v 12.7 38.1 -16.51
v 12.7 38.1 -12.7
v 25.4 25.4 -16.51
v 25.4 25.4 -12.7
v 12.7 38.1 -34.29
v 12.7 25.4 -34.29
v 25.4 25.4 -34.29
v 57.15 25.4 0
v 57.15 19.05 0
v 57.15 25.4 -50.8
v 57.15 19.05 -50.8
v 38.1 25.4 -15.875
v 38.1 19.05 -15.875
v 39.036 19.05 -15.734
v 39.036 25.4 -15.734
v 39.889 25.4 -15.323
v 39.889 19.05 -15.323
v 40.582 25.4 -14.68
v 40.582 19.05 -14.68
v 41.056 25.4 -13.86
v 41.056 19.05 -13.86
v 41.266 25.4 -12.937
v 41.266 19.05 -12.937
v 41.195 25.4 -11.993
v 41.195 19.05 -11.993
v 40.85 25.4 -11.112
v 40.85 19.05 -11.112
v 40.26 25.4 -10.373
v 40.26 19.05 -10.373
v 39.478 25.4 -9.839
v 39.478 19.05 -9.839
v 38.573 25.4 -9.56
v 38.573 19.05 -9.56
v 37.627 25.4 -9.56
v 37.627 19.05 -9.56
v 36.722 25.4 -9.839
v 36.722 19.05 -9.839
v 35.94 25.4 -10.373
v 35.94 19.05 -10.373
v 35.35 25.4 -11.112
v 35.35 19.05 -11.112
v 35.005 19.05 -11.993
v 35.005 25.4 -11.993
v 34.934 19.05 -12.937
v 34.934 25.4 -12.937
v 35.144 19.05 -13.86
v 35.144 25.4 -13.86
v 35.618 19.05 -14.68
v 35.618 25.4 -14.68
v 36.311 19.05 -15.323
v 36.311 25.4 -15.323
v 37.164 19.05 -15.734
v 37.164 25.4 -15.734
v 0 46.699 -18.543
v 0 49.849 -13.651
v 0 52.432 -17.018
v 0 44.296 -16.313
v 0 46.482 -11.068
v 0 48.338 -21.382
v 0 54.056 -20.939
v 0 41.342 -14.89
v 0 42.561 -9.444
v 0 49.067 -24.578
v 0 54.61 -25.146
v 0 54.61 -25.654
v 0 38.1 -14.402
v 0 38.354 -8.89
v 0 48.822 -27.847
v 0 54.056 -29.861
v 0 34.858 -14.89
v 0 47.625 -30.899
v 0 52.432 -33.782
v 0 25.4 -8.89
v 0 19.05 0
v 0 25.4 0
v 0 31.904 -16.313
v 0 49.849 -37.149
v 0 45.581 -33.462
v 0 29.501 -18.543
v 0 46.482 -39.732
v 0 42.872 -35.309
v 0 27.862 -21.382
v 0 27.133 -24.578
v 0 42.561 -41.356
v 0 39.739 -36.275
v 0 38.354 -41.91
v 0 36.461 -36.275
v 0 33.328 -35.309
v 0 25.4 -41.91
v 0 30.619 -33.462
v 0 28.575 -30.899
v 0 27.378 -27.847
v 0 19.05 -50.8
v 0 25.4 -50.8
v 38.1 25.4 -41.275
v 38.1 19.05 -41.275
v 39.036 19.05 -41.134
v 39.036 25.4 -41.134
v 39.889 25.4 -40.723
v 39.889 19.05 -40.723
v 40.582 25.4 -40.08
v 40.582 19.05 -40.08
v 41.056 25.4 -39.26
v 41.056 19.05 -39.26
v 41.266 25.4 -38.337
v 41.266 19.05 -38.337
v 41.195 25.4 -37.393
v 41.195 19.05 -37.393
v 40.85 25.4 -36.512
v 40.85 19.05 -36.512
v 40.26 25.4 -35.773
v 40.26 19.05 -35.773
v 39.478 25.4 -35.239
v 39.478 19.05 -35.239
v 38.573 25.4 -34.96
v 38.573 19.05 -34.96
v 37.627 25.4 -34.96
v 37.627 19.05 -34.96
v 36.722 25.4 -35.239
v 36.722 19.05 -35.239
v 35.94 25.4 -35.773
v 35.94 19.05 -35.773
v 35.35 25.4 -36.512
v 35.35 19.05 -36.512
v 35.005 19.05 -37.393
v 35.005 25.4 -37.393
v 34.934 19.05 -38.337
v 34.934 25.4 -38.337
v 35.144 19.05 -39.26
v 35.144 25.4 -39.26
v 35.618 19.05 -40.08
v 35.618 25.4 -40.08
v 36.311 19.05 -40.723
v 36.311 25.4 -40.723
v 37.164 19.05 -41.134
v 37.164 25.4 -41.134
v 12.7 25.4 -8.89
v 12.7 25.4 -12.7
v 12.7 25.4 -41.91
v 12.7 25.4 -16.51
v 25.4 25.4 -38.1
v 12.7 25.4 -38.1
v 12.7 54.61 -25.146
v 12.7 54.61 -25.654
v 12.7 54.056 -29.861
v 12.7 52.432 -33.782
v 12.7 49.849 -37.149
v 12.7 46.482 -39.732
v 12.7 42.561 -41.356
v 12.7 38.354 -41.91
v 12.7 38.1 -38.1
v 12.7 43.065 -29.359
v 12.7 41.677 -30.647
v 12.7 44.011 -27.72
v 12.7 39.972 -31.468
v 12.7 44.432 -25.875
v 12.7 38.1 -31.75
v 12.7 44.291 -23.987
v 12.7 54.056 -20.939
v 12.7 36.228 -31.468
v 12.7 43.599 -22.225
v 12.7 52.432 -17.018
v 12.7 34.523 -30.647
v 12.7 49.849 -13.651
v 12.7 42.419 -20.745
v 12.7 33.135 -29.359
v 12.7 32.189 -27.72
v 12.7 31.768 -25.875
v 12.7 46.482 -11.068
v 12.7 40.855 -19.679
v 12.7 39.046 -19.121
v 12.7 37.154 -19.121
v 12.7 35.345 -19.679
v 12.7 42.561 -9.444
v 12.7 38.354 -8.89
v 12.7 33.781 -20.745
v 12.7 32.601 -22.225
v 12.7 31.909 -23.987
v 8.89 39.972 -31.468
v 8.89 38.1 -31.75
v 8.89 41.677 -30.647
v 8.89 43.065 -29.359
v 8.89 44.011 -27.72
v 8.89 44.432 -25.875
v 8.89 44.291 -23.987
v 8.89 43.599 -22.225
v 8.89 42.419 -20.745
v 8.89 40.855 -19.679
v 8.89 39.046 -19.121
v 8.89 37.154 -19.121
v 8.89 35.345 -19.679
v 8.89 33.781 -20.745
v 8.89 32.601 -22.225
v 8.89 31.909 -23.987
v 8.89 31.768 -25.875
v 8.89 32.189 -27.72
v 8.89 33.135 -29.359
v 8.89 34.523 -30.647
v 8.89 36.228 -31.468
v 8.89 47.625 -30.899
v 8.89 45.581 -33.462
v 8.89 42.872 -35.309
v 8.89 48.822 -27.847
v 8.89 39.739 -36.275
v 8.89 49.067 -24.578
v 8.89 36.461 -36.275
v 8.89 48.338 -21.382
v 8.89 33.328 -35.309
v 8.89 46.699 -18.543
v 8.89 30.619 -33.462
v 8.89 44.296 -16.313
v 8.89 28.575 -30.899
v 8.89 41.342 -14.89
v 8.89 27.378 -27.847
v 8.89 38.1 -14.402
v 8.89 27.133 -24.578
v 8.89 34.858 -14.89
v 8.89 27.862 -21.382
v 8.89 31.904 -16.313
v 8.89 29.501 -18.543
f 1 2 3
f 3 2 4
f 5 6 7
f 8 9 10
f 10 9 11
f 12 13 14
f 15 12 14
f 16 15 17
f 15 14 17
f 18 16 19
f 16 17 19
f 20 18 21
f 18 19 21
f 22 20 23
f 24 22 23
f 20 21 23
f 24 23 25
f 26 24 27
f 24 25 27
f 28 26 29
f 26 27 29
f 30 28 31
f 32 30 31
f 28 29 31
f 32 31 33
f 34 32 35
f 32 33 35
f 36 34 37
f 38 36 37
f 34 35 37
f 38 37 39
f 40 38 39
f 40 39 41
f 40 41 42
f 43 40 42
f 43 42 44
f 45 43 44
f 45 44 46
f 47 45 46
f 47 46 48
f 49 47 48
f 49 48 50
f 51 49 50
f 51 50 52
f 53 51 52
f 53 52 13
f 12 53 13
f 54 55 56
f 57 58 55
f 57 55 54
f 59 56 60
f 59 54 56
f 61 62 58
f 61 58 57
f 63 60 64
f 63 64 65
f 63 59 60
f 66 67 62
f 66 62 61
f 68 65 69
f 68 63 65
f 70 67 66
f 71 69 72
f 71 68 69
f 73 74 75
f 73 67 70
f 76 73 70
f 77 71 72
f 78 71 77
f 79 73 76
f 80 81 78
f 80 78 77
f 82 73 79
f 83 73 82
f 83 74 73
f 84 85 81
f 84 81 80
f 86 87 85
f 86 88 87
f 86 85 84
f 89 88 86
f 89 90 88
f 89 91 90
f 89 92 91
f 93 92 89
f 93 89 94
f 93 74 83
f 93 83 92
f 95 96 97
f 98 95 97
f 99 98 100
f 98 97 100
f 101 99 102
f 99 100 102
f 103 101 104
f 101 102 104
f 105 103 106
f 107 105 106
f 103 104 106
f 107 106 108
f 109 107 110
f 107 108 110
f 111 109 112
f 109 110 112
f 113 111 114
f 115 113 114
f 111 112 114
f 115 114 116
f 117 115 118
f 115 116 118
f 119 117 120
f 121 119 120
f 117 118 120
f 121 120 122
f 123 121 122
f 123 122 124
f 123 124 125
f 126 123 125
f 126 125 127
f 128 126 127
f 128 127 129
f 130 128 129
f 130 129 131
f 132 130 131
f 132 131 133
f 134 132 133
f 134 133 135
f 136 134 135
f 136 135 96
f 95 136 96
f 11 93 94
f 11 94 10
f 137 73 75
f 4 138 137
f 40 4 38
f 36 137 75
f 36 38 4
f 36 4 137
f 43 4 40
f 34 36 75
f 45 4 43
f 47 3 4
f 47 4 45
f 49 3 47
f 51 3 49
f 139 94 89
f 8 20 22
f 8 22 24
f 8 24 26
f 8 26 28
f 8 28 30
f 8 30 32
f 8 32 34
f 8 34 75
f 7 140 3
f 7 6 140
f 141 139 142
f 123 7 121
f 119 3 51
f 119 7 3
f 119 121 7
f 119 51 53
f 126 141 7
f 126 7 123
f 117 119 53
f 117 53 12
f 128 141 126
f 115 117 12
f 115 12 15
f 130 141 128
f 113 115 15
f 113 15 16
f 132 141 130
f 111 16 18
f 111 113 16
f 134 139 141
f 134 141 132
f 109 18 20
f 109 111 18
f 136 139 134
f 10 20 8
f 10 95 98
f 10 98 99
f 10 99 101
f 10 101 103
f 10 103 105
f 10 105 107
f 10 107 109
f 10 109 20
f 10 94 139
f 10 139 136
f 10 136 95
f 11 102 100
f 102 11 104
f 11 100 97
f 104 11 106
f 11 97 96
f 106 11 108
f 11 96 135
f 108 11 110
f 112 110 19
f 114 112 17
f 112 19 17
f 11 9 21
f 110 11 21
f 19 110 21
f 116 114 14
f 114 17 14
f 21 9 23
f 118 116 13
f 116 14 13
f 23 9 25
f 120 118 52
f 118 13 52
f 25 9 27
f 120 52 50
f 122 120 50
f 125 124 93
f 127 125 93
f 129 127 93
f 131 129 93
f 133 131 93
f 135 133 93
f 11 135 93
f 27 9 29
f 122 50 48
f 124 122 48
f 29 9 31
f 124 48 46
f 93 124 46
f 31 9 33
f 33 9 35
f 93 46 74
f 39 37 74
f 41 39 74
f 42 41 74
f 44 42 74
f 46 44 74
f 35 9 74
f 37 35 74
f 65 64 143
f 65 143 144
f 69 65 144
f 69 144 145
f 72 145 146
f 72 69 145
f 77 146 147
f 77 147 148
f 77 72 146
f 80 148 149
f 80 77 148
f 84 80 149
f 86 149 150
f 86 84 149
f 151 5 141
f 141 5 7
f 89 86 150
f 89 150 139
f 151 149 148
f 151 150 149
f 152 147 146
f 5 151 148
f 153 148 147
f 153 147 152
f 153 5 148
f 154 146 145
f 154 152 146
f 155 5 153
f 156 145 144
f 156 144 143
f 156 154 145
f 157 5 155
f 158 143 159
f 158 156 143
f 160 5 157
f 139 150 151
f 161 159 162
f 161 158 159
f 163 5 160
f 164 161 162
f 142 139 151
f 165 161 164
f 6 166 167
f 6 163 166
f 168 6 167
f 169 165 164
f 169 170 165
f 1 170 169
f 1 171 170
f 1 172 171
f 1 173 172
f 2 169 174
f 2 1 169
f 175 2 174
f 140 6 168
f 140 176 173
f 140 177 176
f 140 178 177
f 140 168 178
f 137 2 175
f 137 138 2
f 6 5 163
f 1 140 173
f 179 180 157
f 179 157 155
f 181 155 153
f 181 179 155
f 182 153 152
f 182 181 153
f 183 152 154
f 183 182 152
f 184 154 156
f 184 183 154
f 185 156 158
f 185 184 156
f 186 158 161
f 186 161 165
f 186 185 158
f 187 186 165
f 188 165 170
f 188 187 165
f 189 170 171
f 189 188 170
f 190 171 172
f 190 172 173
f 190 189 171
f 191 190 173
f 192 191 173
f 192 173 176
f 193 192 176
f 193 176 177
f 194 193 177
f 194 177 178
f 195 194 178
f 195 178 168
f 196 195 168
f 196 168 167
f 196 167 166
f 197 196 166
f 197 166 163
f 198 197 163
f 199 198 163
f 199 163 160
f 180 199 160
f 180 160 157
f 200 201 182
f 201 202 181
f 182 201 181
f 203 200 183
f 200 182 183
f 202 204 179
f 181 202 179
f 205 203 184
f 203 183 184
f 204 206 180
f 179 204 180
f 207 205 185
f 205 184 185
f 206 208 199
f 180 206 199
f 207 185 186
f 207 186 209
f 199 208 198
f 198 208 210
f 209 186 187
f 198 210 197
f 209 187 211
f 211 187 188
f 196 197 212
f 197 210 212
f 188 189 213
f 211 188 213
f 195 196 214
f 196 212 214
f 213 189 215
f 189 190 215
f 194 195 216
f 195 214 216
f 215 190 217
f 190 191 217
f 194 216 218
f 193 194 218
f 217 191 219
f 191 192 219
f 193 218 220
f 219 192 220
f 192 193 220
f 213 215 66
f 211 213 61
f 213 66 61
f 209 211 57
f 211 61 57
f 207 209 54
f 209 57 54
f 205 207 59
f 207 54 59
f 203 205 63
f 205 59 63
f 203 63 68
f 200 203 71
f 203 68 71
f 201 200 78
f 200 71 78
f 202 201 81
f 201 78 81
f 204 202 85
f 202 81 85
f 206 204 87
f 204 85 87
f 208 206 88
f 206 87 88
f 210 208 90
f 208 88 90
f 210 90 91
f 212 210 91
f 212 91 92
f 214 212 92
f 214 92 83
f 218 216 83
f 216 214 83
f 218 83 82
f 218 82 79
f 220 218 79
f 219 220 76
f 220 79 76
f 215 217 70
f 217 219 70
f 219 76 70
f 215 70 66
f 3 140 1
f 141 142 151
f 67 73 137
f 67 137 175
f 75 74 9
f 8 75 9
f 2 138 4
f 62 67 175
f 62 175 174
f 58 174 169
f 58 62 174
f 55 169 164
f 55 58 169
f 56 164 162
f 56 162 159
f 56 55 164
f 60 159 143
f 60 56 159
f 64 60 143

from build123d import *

# Parameters (mm, degrees)
SKETCH1_W           = 57.15
SKETCH1_H           = 50.8
BOSS_EXTRUDE1_DEPTH = 25.4
SKETCH2_W           = 50.8
SKETCH2_H           = 12.7
CUT_EXTRUDE1_DEPTH  = 81.572467382
SKETCH4_R           = 10.9982
BOSS_EXTRUDE2_DEPTH = 12.7
BOSS_EXTRUDE3_START = -3.81
SKETCH5_R           = 10.9982
SKETCH5_R_2         = 6.35
BOSS_EXTRUDE3_DEPTH = 3.81
SKETCH8_R           = 3.175
CUT_EXTRUDE2_DEPTH  = 94.962836271
SKETCH9_W           = 12.7
SKETCH9_H           = 3.81
BOSS_EXTRUDE5_DEPTH = 12.7
CUT_EXTRUDE3_DEPTH  = 88.749556124
CUT_EXTRUDE4_DEPTH  = 94.962836271


with BuildPart() as part:
    # Sketch1 → Boss-Extrude1 (new body)
    with BuildSketch(Plane(origin=(0, 0, 0), x_dir=(1, 0, 0), z_dir=(0, 1, 0))):
        with Locations((28.575, 25.4)):
            Rectangle(SKETCH1_W, SKETCH1_H)
    extrude(amount=BOSS_EXTRUDE1_DEPTH)

    # Sketch2 → Cut-Extrude1 (cut, through all)
    with BuildSketch(Plane.XY):
        with Locations((31.75, 12.7)):
            Rectangle(SKETCH2_W, SKETCH2_H)
    extrude(amount=-CUT_EXTRUDE1_DEPTH, mode=Mode.SUBTRACT)

    # Sketch4 → Boss-Extrude2 (add)
    with BuildSketch(Plane.ZY):
        with BuildLine():
            Line((-41.91, 25.4), (-8.89, 25.4))
            Line((-8.89, 25.4), (-8.89, 38.354))
            ThreePointArc((-8.89, 38.354), (-13.651272165, 49.848727835), (-25.146, 54.61))
            Line((-25.146, 54.61), (-25.654, 54.61))
            ThreePointArc((-25.654, 54.61), (-37.148727835, 49.848727835), (-41.91, 38.354))
            Line((-41.91, 38.354), (-41.91, 25.4))
        make_face()
        with Locations((-25.4, 38.1)):
            Circle(SKETCH4_R, mode=Mode.SUBTRACT)
    extrude(amount=-BOSS_EXTRUDE2_DEPTH)

    # Sketch5 → Boss-Extrude3 (add)
    with BuildSketch(Plane(origin=(12.7, 0, 0), x_dir=(0, 0, -1), z_dir=(1, 0, 0)).offset(BOSS_EXTRUDE3_START)):
        with Locations(Location((25.4, 38.1, 0), (0, 0, 180))):
            Circle(SKETCH5_R)
        with Locations((25.4, 38.1)):
            Circle(SKETCH5_R_2, mode=Mode.SUBTRACT)
    extrude(amount=BOSS_EXTRUDE3_DEPTH)

    # Sketch8 → Cut-Extrude2 (cut, through all)
    with BuildSketch(Plane.XZ):
        with Locations(Location((38.1, -38.1, 0), (0, 0, 270))):
            Circle(SKETCH8_R)
        with Locations(Location((38.1, -12.7, 0), (0, 0, 270))):
            Circle(SKETCH8_R)
    extrude(amount=-CUT_EXTRUDE2_DEPTH, mode=Mode.SUBTRACT)

    # Sketch9 → Boss-Extrude5 (add)
    with BuildSketch(Plane(origin=(0, 25.4, 0), x_dir=(1, 0, 0), z_dir=(0, 1, 0))):
        with Locations((19.05, 14.605)):
            Rectangle(SKETCH9_W, SKETCH9_H)
        with Locations((19.05, 36.195)):
            Rectangle(SKETCH9_W, SKETCH9_H)
    extrude(amount=BOSS_EXTRUDE5_DEPTH)

    # Sketch10 → Cut-Extrude3 (cut, through all)
    with BuildSketch(Plane.XY.offset(-12.7)):
        Polygon((25.4, 25.4), (25.4, 38.1), (12.7, 38.1), align=None)
    extrude(amount=-CUT_EXTRUDE3_DEPTH, mode=Mode.SUBTRACT)

    # Sketch11 → Cut-Extrude4 (cut, through all)
    with BuildSketch(Plane.XY):
        Polygon((6.35, 6.35), (6.35, 19.05), (0, 19.05), (0, 0), (57.15, 0), (57.15, 6.35), align=None)
    extrude(amount=-CUT_EXTRUDE4_DEPTH, mode=Mode.SUBTRACT)


solid = part.part
